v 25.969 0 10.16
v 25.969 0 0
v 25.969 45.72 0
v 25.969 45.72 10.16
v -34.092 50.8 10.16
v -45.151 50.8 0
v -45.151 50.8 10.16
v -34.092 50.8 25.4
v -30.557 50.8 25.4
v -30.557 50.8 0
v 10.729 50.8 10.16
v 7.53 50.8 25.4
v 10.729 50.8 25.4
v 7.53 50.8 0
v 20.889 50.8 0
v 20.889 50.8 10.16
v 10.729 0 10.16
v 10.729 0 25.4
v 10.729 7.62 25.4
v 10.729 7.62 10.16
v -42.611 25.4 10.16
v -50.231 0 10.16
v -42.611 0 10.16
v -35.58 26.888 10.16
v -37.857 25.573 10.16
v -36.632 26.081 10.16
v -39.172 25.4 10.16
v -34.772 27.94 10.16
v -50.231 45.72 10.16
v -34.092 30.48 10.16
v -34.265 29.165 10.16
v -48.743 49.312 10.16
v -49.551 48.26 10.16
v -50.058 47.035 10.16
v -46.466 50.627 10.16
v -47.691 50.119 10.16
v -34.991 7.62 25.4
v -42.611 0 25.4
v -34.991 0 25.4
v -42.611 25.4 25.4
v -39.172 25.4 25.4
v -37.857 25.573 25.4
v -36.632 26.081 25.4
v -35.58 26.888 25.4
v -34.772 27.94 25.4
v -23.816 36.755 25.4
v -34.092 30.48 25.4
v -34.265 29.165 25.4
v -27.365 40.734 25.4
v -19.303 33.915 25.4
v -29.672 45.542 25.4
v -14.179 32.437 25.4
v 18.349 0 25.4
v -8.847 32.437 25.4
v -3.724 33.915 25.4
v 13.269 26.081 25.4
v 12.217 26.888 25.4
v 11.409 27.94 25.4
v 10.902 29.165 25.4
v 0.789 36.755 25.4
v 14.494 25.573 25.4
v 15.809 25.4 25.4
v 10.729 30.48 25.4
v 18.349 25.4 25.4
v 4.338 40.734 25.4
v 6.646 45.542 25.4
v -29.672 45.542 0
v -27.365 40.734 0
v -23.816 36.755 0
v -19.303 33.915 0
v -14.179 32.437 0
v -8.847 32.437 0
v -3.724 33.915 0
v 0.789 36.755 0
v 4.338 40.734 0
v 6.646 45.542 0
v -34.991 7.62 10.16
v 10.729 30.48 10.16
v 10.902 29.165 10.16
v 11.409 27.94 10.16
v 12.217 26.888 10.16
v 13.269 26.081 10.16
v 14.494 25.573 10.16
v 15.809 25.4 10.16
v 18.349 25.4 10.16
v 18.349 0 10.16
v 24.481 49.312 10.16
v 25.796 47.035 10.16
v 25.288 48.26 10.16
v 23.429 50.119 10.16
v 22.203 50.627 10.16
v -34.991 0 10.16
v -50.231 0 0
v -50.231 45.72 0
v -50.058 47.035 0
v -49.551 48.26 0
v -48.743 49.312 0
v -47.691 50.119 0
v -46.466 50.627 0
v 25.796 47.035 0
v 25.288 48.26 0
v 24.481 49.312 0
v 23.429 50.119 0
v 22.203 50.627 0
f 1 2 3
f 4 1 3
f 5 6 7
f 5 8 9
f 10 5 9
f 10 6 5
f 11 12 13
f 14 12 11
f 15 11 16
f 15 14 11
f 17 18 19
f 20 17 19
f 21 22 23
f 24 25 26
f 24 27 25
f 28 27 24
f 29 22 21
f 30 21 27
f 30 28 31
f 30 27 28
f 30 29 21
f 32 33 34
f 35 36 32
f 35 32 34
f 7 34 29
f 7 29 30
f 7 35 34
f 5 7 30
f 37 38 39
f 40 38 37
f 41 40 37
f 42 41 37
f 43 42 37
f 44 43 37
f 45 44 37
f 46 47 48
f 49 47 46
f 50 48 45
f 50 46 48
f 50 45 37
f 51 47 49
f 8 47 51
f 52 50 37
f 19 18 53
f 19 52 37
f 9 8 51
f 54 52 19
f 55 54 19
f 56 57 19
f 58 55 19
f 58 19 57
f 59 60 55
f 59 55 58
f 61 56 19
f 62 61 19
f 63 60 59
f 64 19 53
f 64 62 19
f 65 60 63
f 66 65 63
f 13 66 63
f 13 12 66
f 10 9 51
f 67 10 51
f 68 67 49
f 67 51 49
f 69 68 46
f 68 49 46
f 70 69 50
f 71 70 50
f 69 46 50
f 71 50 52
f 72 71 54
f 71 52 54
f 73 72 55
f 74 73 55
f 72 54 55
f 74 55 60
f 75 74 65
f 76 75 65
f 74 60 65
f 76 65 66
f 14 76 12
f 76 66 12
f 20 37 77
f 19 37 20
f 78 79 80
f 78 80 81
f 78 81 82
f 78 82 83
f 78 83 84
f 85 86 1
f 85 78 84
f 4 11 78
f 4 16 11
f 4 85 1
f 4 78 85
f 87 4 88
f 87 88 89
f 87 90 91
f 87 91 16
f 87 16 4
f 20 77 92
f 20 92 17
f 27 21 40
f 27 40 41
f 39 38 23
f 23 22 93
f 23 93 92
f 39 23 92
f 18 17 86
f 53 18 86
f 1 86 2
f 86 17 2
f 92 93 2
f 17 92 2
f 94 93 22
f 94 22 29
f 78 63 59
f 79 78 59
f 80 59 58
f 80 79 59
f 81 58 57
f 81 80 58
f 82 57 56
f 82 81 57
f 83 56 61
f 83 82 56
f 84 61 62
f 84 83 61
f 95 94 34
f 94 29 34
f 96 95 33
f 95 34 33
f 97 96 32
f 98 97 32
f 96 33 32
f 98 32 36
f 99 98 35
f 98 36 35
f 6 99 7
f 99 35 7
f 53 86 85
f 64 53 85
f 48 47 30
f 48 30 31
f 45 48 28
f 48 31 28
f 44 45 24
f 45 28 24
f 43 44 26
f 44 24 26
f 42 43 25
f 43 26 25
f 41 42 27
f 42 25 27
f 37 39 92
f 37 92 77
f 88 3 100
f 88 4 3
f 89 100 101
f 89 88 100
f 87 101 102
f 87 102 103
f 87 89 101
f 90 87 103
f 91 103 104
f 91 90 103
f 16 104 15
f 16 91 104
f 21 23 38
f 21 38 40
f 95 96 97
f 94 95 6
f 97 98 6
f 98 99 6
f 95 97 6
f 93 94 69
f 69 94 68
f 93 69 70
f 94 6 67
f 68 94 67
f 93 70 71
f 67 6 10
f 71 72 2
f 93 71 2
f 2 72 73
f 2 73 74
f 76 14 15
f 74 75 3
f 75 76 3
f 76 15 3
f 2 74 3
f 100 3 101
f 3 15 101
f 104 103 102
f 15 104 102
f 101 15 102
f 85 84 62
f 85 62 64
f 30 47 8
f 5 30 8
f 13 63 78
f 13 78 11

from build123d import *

# Parameters (mm, degrees)
F0_W     = 76.2
F0_H     = 50.8
F1_DEPTH = 10.16
F2_W     = 60.96
F2_H     = 50.8
F3_DEPTH = 25.4
F5_DEPTH = 25.401
F4_W     = 8.5195787251
F4_H     = 25.4
F4_W_2   = 7.62
F4_W_3   = 45.72
F4_H_2   = 7.62
F6_DEPTH = 15.24
F7_R     = 5.08
F8_R     = 5.08
F9_R     = 5.08


with BuildPart() as f1:
    # F0 (on Top) → F1 (new body)
    with BuildSketch(Plane.XY):
        with Locations((-12.131340879, 25.4)):
            Rectangle(F0_W, F0_H)
    extrude(amount=F1_DEPTH)

    # F2 (on Top) → F3 (join)
    with BuildSketch(Plane.XY):
        with Locations((-12.131340879, 25.4)):
            Rectangle(F2_W, F2_H)
    extrude(amount=F3_DEPTH)

    # F4 (on face) → F5 (cut, through all)
    with BuildSketch(Plane.XY.offset(25.4)):
        with BuildLine():
            Line((7.5301669641, 50.8), (-30.5567246034, 50.8))
            ThreePointArc((-30.5567246034, 50.8), (-11.5132788196, 32.2496725738), (7.5301669641, 50.8))
        make_face()
        with BuildLine():
            ThreePointArc((7.5367211804, 51.2996725738), (-11.7631365985, 70.3480339493), (-30.5567246034, 50.8))
            Line((-30.5567246034, 50.8), (7.5301669641, 50.8))
            ThreePointArc((7.5301669641, 50.8), (7.5350825558, 51.0498147949), (7.5367211804, 51.2996725738))
        make_face()
    extrude(amount=-F5_DEPTH, mode=Mode.SUBTRACT)

    # F4 (on face) → F6 (cut, through all)
    with BuildSketch(Plane.XY.offset(25.4)):
        with Locations((-38.3515515165, 38.1)):
            Rectangle(F4_W, F4_H)
        with Locations((14.538659121, 38.1)):
            Rectangle(F4_W_2, F4_H)
        with Locations((-12.131340879, 3.81)):
            Rectangle(F4_W_3, F4_H_2)
    extrude(amount=-F6_DEPTH, mode=Mode.SUBTRACT)

    # F7
    f7_edges = [f1.edges().sort_by_distance(p)[0] for p in [
        (-50.231341, 50.8, 5.08),
    ]]
    fillet(f7_edges, radius=F7_R)

    # F8
    f8_edges = [f1.edges().sort_by_distance(p)[0] for p in [
        (25.968659, 50.8, 5.08),
    ]]
    fillet(f8_edges, radius=F8_R)

    # F9
    f9_edges = [f1.edges().sort_by_distance(p)[0] for p in [
        (-34.091762, 25.4, 17.78),
        (10.728659, 25.4, 17.78),
    ]]
    fillet(f9_edges, radius=F9_R)


solid = f1.part
